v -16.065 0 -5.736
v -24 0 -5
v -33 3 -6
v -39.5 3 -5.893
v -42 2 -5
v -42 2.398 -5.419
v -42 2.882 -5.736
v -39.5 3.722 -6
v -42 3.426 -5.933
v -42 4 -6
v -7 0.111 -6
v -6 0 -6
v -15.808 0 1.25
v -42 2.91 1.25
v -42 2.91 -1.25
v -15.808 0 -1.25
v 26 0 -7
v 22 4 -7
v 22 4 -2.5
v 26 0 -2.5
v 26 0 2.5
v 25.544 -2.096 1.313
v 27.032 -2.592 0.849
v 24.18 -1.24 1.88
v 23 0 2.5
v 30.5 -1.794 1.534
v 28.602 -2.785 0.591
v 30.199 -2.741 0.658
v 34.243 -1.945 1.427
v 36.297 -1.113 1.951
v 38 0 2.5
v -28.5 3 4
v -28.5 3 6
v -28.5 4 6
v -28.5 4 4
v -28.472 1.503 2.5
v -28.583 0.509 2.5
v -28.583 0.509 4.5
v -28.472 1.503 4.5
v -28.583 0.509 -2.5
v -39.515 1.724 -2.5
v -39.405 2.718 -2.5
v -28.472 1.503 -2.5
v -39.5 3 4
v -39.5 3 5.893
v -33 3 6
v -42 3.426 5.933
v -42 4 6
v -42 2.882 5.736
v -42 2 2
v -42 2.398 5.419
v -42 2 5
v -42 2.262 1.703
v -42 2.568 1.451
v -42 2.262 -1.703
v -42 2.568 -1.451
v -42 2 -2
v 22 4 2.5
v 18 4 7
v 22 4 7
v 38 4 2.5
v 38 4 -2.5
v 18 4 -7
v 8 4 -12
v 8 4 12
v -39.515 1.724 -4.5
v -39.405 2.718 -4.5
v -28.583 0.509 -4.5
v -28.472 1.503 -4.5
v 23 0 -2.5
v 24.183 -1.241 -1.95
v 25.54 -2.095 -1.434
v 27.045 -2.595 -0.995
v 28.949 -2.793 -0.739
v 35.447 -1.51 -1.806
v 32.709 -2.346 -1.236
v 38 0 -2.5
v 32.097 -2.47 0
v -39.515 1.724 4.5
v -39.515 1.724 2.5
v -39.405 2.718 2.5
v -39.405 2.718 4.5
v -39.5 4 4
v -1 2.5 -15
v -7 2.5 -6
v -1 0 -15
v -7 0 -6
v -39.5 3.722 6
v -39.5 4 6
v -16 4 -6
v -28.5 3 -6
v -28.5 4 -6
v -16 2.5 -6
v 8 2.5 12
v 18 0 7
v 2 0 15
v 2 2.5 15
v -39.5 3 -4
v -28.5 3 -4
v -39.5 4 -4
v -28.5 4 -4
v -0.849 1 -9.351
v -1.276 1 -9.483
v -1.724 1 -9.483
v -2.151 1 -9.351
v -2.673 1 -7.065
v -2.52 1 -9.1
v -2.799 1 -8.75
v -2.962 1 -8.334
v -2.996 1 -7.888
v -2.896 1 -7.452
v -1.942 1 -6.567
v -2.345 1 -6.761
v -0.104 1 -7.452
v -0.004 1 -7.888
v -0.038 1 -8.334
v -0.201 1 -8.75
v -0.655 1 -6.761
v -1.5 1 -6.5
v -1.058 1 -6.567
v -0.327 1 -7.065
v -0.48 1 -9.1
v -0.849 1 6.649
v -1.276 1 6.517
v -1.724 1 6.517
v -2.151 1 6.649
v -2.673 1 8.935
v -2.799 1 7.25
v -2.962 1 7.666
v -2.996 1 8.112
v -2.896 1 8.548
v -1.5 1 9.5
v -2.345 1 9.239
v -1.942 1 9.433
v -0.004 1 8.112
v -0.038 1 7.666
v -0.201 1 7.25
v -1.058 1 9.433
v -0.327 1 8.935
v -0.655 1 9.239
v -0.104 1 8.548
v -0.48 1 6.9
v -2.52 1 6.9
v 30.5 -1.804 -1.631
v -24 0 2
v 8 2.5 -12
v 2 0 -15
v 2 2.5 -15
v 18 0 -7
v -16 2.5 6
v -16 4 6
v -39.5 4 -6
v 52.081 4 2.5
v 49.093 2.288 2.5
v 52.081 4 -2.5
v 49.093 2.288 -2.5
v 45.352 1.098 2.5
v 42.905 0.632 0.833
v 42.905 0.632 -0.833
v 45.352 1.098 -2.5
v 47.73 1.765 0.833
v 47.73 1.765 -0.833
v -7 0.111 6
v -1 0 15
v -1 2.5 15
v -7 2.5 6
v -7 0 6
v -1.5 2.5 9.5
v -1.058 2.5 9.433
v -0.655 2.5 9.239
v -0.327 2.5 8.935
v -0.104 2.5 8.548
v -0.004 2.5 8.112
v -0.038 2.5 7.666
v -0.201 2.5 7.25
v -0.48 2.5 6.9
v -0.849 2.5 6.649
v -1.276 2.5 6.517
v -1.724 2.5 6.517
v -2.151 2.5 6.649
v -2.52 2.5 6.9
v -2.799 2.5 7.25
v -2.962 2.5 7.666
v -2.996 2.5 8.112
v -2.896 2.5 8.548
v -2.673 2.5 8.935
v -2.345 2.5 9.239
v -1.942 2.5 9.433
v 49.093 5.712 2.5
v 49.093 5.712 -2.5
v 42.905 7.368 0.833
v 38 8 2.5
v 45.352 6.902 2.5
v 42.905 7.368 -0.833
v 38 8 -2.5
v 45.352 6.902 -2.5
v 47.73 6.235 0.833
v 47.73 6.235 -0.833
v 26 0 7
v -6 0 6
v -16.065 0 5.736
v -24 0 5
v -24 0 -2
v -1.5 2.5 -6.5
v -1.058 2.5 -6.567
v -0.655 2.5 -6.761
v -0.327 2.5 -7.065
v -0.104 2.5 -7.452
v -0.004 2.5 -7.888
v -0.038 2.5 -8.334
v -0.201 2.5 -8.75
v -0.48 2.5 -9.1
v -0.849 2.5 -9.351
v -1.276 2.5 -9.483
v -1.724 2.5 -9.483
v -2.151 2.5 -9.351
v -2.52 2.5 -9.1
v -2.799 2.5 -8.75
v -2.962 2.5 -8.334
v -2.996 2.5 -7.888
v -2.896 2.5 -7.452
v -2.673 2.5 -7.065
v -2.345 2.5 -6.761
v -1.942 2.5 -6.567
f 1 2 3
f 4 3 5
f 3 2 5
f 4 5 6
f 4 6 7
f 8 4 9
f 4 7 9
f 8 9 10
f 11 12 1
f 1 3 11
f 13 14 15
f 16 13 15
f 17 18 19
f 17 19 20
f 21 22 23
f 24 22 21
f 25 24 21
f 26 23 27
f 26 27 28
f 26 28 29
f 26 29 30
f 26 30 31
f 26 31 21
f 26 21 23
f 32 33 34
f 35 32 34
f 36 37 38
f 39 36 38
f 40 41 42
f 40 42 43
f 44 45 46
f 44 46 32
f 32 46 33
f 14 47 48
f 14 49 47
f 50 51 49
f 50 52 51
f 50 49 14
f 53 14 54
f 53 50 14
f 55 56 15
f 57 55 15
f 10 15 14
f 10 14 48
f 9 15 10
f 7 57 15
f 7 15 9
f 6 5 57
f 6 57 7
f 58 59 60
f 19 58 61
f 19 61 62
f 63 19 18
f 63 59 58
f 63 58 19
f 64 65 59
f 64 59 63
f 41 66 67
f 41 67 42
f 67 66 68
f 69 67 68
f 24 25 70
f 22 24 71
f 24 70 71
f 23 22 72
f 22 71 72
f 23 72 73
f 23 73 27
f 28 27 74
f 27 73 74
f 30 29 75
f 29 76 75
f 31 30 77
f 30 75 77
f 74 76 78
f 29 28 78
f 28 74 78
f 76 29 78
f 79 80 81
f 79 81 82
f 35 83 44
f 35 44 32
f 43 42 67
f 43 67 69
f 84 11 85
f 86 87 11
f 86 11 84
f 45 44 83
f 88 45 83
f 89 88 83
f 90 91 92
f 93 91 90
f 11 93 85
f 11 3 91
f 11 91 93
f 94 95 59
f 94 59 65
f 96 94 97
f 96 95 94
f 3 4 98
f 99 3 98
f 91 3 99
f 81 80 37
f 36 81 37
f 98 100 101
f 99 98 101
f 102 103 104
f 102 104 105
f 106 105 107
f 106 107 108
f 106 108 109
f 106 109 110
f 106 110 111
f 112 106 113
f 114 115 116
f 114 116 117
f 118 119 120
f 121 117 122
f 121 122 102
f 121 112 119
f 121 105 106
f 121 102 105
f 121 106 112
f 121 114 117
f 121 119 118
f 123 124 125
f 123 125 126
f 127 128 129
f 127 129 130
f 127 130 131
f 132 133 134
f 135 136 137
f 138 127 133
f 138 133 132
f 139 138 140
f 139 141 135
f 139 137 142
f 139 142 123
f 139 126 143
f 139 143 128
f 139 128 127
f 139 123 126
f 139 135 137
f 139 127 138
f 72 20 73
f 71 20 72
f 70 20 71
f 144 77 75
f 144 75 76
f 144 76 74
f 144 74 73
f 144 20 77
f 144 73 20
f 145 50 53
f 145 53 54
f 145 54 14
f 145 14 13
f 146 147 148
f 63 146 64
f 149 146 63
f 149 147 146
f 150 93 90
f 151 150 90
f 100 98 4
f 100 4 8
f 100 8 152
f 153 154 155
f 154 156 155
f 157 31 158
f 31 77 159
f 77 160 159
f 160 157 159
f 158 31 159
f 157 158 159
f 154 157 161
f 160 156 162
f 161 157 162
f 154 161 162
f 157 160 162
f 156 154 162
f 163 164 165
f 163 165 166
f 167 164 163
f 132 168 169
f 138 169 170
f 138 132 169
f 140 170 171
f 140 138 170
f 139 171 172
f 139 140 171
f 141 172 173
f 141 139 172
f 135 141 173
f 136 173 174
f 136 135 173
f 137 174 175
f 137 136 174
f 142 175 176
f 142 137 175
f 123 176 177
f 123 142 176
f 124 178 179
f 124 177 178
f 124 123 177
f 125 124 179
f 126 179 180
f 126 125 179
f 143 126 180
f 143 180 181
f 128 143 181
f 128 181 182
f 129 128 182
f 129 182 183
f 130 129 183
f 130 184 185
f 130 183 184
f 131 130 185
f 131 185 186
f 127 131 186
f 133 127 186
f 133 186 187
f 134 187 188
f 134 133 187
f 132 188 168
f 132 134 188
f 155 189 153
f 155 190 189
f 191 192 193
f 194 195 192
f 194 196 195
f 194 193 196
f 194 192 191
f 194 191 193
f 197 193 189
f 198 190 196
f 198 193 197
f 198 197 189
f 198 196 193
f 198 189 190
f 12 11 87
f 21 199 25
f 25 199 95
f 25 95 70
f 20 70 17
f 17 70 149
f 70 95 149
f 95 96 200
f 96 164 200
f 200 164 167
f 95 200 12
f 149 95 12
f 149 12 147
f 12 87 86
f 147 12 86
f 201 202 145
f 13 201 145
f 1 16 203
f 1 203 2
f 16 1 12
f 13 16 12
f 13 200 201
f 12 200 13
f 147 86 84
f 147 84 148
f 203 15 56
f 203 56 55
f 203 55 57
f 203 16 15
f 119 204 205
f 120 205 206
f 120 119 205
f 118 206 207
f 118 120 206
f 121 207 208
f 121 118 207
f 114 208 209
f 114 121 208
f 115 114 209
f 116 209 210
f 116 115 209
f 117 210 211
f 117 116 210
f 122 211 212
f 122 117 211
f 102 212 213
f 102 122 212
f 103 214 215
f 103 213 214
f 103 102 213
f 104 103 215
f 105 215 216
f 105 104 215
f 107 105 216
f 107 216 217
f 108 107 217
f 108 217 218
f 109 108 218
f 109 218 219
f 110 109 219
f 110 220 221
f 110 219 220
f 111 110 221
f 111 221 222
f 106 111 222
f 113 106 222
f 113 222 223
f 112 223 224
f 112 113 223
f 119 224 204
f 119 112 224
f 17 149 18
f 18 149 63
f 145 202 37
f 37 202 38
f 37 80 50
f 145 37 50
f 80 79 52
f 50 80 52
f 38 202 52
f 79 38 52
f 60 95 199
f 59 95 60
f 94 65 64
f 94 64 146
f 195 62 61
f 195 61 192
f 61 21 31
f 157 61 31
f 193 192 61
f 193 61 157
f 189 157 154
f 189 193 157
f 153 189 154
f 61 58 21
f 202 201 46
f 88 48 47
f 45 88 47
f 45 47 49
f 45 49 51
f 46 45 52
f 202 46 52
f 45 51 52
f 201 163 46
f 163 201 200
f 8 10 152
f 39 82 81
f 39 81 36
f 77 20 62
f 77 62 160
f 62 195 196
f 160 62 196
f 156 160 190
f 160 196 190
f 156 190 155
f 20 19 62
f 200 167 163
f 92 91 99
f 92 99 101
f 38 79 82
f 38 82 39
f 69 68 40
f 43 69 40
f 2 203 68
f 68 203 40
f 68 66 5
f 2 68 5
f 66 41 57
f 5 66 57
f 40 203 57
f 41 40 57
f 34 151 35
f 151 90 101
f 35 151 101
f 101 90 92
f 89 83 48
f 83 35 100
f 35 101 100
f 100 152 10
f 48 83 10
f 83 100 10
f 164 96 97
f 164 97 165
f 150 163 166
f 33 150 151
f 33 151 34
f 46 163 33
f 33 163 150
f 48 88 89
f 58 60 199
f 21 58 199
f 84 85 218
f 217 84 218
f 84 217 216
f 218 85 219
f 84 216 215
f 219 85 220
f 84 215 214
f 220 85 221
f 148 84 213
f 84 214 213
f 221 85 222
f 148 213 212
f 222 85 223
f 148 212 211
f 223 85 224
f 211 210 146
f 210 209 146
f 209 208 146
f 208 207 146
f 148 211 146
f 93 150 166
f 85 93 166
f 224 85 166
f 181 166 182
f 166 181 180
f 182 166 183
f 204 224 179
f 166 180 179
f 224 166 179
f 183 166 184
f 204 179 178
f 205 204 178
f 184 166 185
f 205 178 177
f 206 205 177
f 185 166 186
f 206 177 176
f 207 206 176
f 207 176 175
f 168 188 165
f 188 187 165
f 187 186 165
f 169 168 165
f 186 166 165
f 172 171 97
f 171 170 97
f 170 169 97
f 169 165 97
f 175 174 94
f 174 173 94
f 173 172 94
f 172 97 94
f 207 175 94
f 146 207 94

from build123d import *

# Parameters (mm, degrees)
BOSS_EXTRUDE1_DEPTH     = 4
SKETCH2_R               = 1.5
BOSS_EXTRUDE2_DEPTH     = 3
CUT_EXTRUDE1_DEPTH      = 13
CUT_EXTRUDE2_DEPTH      = 49
CUT_EXTRUDE3_DEPTH      = 49
CUT_EXTRUDE3_DEPTH_BACK = 3
SKETCH5_R               = 1.5
CUT_EXTRUDE4_DEPTH      = 41
SKETCH7_W               = 11
SKETCH7_H               = 1
CUT_EXTRUDE5_DEPTH      = 2
CUT_EXTRUDE6_START      = -12
SKETCH7_2_W             = 11
SKETCH7_2_H             = 1
CUT_EXTRUDE6_DEPTH      = 2
SKETCH8_W               = 11
SKETCH8_H               = 2
CUT_EXTRUDE7_DEPTH      = 1
SKETCH9_W               = 14
SKETCH9_H               = 4
BOSS_EXTRUDE3_DEPTH     = 15
CUT_EXTRUDE8_DEPTH      = 15
SKETCH12_W              = 12
SKETCH12_H              = 4.5
CUT_EXTRUDE9_DEPTH      = 15
BOSS_EXTRUDE4_START     = -4.5
BOSS_EXTRUDE4_DEPTH     = 5
CUT_EXTRUDE10_DEPTH     = 4.5
CUT_EXTRUDE11_START     = -14
CUT_EXTRUDE11_DEPTH     = 4.5


with BuildPart() as part:
    # Sketch1 → Boss-Extrude1 (new body)
    with BuildSketch(Plane(origin=(0, 0, 0), x_dir=(1, 0, 0), z_dir=(0, 1, 0))):
        Polygon((-1, 15), (2, 15), (18, 7), (23, 7), (23, -7), (18, -7), (2, -15), (-1, -15), (-7, -6), (-42, -6), (-42, 6), (-7, 6), align=None)
    extrude(amount=BOSS_EXTRUDE1_DEPTH)

    # Sketch2 → Boss-Extrude2 (add)
    with BuildSketch(Plane(origin=(0, 4, 0), x_dir=(1, 0, 0), z_dir=(0, 1, 0))):
        with Locations(Location((-1.5, 8, 0), (0, 0, 270))):
            Circle(SKETCH2_R)
        with Locations(Location((-1.5, -8, 0), (0, 0, 90))):
            Circle(SKETCH2_R)
    extrude(amount=BOSS_EXTRUDE2_DEPTH)

    # Sketch3 → Cut-Extrude1 (cut)
    with BuildSketch(Plane.XY.offset(6)):
        Polygon((-24, 0), (-42, 2), (-42, 0), align=None)
    extrude(amount=-CUT_EXTRUDE1_DEPTH, mode=Mode.SUBTRACT)

    # Sketch4 → Cut-Extrude2 (cut, along a direction that is not the sketch's normal)
    with BuildSketch(Plane.ZY.offset(42)):
        with BuildLine():
            ThreePointArc((-5, 2), (-5.736067977, 2.881966011), (-6, 4))
            Line((-6, 4), (-6, 2))
            Line((-6, 2), (-5, 2))
        make_face()
        with BuildLine():
            Line((1.25, 2.910275264), (-1.25, 2.910275264))
            ThreePointArc((-1.25, 2.910275264), (-1.570550528, 2.410275264), (-2, 2))
            Line((-2, 2), (2, 2))
            ThreePointArc((2, 2), (1.570550528, 2.410275264), (1.25, 2.910275264))
        make_face()
        with BuildLine():
            Line((5, 2), (6, 2))
            Line((6, 2), (6, 4))
            ThreePointArc((6, 4), (5.736067977, 2.881966011), (5, 2))
        make_face()
    extrude(amount=-CUT_EXTRUDE2_DEPTH, dir=(-0.9938837346736189, 0.11043152607484653, 0), mode=Mode.SUBTRACT)

    # Sketch5 → Cut-Extrude3 (cut, two sides: drawn at the far end of the back side and taken through both)
    with BuildSketch(Plane(origin=(0, 4, 0), x_dir=(1, 0, 0), z_dir=(0, 1, 0)).offset(-CUT_EXTRUDE3_DEPTH_BACK)):
        with Locations(Location((-1.5, 8, 0), (0, 0, 270))):
            Circle(SKETCH5_R)
        with Locations(Location((-1.5, -8, 0), (0, 0, 270))):
            Circle(SKETCH5_R)
    extrude(amount=CUT_EXTRUDE3_DEPTH + CUT_EXTRUDE3_DEPTH_BACK, mode=Mode.SUBTRACT)

    # Sketch6 → Cut-Extrude4 (cut)
    with BuildSketch(Plane.XY.offset(15)):
        Polygon((-7, 4), (8, 4), (8, 2.5), (-7, 2.5), (-16, 2.5), (-16, 4), align=None)
    extrude(amount=-CUT_EXTRUDE4_DEPTH, mode=Mode.SUBTRACT)

    # Sketch7 → Cut-Extrude5 (cut)
    with BuildSketch(Plane.XY.offset(6)):
        with Locations((-34, 3.5)):
            Rectangle(SKETCH7_W, SKETCH7_H)
    extrude(amount=-CUT_EXTRUDE5_DEPTH, mode=Mode.SUBTRACT)

    # Sketch7<2> → Cut-Extrude6 (cut)
    with BuildSketch(Plane.XY.offset(6).offset(CUT_EXTRUDE6_START)):
        with Locations((-34, 3.5)):
            Rectangle(SKETCH7_2_W, SKETCH7_2_H)
    extrude(amount=CUT_EXTRUDE6_DEPTH, mode=Mode.SUBTRACT)

    # Sketch8 → Cut-Extrude7 (cut)
    with BuildSketch(Plane(origin=(-0.292682927, -2.634146341, 0), x_dir=(0.9938837346736189, -0.11043152607484653, 0), z_dir=(-0.11043152607484653, -0.9938837346736189, 0))):
        with Locations((-33.963979908, -3.5)):
            Rectangle(SKETCH8_W, SKETCH8_H)
        with Locations((-33.963979908, 3.5)):
            Rectangle(SKETCH8_W, SKETCH8_H)
    extrude(amount=-CUT_EXTRUDE7_DEPTH, mode=Mode.SUBTRACT)

    # Sketch9 → Boss-Extrude3 (add)
    with BuildSketch(Plane(origin=(23, 0, 0), x_dir=(0, 0, -1), z_dir=(1, 0, 0))):
        with Locations((0, 2)):
            Rectangle(SKETCH9_W, SKETCH9_H)
        with BuildLine():
            add(Edge.make_bspline(
                [(2.5, 0), (0.172282059, -6.003423798), (-2.5, 0)],
                knots=[0, 0, 0, 1, 1, 1], degree=2))
            Line((2.5, 0), (-2.5, 0))
        make_face()
    extrude(amount=BOSS_EXTRUDE3_DEPTH)

    # Sketch10 → Cut-Extrude8 (cut)
    with BuildSketch(Plane(origin=(0, 0, -7), x_dir=(-1, 0, 0), z_dir=(0, 0, -1))):
        with BuildLine():
            Line((-23, 0), (-23, -3.001711899))
            Line((-23, -3.001711899), (-38, -3.001711899))
            Line((-38, -3.001711899), (-38, 0))
            add(Edge.make_bspline(
                [(-23, 0), (-25.315557178, -3.079564153), (-31.097350972, -3.102014712), (-36.3128438, -1.382343261), (-38, 0)],
                knots=[0, 0, 0, 0, 0.604336881, 1, 1, 1, 1], degree=3))
        make_face()
    extrude(amount=-CUT_EXTRUDE8_DEPTH, mode=Mode.SUBTRACT)

    # Sketch12 → Cut-Extrude9 (cut)
    with BuildSketch(Plane.XZ):
        with Locations((32, -4.75)):
            Rectangle(SKETCH12_W, SKETCH12_H)
        with Locations((32, 4.75)):
            Rectangle(SKETCH12_W, SKETCH12_H)
    extrude(amount=-CUT_EXTRUDE9_DEPTH, mode=Mode.SUBTRACT)

    # Sketch10<4> → Boss-Extrude4 (add)
    with BuildSketch(Plane(origin=(0, 0, -7), x_dir=(-1, 0, 0), z_dir=(0, 0, -1)).offset(BOSS_EXTRUDE4_START)):
        with BuildLine():
            add(Edge.make_bspline(
                [(-38, 0), (-42.812604694, 0.581647057), (-48.098359819, 1.012932082), (-52.080952957, 4)],
                knots=[0, 0, 0, 0, 1, 1, 1, 1], degree=3))
            Line((-52.080952957, 4), (-38, 4))
            Line((-38, 4), (-38, 0))
        make_face()
        with BuildLine():
            Line((-52.080952957, 4), (-38, 4))
            Line((-38, 4), (-38, 8))
            add(Edge.make_bspline(
                [(-38, 8), (-42.812604694, 7.418352943), (-48.098359819, 6.987067918), (-52.080952957, 4)],
                knots=[0, 0, 0, 0, 1, 1, 1, 1], degree=3))
        make_face()
    extrude(amount=-BOSS_EXTRUDE4_DEPTH)

    # Sketch13 → Cut-Extrude10 (cut)
    with BuildSketch(Plane.XY.offset(7)):
        Polygon((22, 4), (26, 0), (26, 4), align=None)
    extrude(amount=-CUT_EXTRUDE10_DEPTH, mode=Mode.SUBTRACT)

    # Sketch13<2> → Cut-Extrude11 (cut)
    with BuildSketch(Plane.XY.offset(7).offset(CUT_EXTRUDE11_START)):
        Polygon((22, 4), (26, 0), (26, 4), align=None)
    extrude(amount=CUT_EXTRUDE11_DEPTH, mode=Mode.SUBTRACT)


solid = part.part
